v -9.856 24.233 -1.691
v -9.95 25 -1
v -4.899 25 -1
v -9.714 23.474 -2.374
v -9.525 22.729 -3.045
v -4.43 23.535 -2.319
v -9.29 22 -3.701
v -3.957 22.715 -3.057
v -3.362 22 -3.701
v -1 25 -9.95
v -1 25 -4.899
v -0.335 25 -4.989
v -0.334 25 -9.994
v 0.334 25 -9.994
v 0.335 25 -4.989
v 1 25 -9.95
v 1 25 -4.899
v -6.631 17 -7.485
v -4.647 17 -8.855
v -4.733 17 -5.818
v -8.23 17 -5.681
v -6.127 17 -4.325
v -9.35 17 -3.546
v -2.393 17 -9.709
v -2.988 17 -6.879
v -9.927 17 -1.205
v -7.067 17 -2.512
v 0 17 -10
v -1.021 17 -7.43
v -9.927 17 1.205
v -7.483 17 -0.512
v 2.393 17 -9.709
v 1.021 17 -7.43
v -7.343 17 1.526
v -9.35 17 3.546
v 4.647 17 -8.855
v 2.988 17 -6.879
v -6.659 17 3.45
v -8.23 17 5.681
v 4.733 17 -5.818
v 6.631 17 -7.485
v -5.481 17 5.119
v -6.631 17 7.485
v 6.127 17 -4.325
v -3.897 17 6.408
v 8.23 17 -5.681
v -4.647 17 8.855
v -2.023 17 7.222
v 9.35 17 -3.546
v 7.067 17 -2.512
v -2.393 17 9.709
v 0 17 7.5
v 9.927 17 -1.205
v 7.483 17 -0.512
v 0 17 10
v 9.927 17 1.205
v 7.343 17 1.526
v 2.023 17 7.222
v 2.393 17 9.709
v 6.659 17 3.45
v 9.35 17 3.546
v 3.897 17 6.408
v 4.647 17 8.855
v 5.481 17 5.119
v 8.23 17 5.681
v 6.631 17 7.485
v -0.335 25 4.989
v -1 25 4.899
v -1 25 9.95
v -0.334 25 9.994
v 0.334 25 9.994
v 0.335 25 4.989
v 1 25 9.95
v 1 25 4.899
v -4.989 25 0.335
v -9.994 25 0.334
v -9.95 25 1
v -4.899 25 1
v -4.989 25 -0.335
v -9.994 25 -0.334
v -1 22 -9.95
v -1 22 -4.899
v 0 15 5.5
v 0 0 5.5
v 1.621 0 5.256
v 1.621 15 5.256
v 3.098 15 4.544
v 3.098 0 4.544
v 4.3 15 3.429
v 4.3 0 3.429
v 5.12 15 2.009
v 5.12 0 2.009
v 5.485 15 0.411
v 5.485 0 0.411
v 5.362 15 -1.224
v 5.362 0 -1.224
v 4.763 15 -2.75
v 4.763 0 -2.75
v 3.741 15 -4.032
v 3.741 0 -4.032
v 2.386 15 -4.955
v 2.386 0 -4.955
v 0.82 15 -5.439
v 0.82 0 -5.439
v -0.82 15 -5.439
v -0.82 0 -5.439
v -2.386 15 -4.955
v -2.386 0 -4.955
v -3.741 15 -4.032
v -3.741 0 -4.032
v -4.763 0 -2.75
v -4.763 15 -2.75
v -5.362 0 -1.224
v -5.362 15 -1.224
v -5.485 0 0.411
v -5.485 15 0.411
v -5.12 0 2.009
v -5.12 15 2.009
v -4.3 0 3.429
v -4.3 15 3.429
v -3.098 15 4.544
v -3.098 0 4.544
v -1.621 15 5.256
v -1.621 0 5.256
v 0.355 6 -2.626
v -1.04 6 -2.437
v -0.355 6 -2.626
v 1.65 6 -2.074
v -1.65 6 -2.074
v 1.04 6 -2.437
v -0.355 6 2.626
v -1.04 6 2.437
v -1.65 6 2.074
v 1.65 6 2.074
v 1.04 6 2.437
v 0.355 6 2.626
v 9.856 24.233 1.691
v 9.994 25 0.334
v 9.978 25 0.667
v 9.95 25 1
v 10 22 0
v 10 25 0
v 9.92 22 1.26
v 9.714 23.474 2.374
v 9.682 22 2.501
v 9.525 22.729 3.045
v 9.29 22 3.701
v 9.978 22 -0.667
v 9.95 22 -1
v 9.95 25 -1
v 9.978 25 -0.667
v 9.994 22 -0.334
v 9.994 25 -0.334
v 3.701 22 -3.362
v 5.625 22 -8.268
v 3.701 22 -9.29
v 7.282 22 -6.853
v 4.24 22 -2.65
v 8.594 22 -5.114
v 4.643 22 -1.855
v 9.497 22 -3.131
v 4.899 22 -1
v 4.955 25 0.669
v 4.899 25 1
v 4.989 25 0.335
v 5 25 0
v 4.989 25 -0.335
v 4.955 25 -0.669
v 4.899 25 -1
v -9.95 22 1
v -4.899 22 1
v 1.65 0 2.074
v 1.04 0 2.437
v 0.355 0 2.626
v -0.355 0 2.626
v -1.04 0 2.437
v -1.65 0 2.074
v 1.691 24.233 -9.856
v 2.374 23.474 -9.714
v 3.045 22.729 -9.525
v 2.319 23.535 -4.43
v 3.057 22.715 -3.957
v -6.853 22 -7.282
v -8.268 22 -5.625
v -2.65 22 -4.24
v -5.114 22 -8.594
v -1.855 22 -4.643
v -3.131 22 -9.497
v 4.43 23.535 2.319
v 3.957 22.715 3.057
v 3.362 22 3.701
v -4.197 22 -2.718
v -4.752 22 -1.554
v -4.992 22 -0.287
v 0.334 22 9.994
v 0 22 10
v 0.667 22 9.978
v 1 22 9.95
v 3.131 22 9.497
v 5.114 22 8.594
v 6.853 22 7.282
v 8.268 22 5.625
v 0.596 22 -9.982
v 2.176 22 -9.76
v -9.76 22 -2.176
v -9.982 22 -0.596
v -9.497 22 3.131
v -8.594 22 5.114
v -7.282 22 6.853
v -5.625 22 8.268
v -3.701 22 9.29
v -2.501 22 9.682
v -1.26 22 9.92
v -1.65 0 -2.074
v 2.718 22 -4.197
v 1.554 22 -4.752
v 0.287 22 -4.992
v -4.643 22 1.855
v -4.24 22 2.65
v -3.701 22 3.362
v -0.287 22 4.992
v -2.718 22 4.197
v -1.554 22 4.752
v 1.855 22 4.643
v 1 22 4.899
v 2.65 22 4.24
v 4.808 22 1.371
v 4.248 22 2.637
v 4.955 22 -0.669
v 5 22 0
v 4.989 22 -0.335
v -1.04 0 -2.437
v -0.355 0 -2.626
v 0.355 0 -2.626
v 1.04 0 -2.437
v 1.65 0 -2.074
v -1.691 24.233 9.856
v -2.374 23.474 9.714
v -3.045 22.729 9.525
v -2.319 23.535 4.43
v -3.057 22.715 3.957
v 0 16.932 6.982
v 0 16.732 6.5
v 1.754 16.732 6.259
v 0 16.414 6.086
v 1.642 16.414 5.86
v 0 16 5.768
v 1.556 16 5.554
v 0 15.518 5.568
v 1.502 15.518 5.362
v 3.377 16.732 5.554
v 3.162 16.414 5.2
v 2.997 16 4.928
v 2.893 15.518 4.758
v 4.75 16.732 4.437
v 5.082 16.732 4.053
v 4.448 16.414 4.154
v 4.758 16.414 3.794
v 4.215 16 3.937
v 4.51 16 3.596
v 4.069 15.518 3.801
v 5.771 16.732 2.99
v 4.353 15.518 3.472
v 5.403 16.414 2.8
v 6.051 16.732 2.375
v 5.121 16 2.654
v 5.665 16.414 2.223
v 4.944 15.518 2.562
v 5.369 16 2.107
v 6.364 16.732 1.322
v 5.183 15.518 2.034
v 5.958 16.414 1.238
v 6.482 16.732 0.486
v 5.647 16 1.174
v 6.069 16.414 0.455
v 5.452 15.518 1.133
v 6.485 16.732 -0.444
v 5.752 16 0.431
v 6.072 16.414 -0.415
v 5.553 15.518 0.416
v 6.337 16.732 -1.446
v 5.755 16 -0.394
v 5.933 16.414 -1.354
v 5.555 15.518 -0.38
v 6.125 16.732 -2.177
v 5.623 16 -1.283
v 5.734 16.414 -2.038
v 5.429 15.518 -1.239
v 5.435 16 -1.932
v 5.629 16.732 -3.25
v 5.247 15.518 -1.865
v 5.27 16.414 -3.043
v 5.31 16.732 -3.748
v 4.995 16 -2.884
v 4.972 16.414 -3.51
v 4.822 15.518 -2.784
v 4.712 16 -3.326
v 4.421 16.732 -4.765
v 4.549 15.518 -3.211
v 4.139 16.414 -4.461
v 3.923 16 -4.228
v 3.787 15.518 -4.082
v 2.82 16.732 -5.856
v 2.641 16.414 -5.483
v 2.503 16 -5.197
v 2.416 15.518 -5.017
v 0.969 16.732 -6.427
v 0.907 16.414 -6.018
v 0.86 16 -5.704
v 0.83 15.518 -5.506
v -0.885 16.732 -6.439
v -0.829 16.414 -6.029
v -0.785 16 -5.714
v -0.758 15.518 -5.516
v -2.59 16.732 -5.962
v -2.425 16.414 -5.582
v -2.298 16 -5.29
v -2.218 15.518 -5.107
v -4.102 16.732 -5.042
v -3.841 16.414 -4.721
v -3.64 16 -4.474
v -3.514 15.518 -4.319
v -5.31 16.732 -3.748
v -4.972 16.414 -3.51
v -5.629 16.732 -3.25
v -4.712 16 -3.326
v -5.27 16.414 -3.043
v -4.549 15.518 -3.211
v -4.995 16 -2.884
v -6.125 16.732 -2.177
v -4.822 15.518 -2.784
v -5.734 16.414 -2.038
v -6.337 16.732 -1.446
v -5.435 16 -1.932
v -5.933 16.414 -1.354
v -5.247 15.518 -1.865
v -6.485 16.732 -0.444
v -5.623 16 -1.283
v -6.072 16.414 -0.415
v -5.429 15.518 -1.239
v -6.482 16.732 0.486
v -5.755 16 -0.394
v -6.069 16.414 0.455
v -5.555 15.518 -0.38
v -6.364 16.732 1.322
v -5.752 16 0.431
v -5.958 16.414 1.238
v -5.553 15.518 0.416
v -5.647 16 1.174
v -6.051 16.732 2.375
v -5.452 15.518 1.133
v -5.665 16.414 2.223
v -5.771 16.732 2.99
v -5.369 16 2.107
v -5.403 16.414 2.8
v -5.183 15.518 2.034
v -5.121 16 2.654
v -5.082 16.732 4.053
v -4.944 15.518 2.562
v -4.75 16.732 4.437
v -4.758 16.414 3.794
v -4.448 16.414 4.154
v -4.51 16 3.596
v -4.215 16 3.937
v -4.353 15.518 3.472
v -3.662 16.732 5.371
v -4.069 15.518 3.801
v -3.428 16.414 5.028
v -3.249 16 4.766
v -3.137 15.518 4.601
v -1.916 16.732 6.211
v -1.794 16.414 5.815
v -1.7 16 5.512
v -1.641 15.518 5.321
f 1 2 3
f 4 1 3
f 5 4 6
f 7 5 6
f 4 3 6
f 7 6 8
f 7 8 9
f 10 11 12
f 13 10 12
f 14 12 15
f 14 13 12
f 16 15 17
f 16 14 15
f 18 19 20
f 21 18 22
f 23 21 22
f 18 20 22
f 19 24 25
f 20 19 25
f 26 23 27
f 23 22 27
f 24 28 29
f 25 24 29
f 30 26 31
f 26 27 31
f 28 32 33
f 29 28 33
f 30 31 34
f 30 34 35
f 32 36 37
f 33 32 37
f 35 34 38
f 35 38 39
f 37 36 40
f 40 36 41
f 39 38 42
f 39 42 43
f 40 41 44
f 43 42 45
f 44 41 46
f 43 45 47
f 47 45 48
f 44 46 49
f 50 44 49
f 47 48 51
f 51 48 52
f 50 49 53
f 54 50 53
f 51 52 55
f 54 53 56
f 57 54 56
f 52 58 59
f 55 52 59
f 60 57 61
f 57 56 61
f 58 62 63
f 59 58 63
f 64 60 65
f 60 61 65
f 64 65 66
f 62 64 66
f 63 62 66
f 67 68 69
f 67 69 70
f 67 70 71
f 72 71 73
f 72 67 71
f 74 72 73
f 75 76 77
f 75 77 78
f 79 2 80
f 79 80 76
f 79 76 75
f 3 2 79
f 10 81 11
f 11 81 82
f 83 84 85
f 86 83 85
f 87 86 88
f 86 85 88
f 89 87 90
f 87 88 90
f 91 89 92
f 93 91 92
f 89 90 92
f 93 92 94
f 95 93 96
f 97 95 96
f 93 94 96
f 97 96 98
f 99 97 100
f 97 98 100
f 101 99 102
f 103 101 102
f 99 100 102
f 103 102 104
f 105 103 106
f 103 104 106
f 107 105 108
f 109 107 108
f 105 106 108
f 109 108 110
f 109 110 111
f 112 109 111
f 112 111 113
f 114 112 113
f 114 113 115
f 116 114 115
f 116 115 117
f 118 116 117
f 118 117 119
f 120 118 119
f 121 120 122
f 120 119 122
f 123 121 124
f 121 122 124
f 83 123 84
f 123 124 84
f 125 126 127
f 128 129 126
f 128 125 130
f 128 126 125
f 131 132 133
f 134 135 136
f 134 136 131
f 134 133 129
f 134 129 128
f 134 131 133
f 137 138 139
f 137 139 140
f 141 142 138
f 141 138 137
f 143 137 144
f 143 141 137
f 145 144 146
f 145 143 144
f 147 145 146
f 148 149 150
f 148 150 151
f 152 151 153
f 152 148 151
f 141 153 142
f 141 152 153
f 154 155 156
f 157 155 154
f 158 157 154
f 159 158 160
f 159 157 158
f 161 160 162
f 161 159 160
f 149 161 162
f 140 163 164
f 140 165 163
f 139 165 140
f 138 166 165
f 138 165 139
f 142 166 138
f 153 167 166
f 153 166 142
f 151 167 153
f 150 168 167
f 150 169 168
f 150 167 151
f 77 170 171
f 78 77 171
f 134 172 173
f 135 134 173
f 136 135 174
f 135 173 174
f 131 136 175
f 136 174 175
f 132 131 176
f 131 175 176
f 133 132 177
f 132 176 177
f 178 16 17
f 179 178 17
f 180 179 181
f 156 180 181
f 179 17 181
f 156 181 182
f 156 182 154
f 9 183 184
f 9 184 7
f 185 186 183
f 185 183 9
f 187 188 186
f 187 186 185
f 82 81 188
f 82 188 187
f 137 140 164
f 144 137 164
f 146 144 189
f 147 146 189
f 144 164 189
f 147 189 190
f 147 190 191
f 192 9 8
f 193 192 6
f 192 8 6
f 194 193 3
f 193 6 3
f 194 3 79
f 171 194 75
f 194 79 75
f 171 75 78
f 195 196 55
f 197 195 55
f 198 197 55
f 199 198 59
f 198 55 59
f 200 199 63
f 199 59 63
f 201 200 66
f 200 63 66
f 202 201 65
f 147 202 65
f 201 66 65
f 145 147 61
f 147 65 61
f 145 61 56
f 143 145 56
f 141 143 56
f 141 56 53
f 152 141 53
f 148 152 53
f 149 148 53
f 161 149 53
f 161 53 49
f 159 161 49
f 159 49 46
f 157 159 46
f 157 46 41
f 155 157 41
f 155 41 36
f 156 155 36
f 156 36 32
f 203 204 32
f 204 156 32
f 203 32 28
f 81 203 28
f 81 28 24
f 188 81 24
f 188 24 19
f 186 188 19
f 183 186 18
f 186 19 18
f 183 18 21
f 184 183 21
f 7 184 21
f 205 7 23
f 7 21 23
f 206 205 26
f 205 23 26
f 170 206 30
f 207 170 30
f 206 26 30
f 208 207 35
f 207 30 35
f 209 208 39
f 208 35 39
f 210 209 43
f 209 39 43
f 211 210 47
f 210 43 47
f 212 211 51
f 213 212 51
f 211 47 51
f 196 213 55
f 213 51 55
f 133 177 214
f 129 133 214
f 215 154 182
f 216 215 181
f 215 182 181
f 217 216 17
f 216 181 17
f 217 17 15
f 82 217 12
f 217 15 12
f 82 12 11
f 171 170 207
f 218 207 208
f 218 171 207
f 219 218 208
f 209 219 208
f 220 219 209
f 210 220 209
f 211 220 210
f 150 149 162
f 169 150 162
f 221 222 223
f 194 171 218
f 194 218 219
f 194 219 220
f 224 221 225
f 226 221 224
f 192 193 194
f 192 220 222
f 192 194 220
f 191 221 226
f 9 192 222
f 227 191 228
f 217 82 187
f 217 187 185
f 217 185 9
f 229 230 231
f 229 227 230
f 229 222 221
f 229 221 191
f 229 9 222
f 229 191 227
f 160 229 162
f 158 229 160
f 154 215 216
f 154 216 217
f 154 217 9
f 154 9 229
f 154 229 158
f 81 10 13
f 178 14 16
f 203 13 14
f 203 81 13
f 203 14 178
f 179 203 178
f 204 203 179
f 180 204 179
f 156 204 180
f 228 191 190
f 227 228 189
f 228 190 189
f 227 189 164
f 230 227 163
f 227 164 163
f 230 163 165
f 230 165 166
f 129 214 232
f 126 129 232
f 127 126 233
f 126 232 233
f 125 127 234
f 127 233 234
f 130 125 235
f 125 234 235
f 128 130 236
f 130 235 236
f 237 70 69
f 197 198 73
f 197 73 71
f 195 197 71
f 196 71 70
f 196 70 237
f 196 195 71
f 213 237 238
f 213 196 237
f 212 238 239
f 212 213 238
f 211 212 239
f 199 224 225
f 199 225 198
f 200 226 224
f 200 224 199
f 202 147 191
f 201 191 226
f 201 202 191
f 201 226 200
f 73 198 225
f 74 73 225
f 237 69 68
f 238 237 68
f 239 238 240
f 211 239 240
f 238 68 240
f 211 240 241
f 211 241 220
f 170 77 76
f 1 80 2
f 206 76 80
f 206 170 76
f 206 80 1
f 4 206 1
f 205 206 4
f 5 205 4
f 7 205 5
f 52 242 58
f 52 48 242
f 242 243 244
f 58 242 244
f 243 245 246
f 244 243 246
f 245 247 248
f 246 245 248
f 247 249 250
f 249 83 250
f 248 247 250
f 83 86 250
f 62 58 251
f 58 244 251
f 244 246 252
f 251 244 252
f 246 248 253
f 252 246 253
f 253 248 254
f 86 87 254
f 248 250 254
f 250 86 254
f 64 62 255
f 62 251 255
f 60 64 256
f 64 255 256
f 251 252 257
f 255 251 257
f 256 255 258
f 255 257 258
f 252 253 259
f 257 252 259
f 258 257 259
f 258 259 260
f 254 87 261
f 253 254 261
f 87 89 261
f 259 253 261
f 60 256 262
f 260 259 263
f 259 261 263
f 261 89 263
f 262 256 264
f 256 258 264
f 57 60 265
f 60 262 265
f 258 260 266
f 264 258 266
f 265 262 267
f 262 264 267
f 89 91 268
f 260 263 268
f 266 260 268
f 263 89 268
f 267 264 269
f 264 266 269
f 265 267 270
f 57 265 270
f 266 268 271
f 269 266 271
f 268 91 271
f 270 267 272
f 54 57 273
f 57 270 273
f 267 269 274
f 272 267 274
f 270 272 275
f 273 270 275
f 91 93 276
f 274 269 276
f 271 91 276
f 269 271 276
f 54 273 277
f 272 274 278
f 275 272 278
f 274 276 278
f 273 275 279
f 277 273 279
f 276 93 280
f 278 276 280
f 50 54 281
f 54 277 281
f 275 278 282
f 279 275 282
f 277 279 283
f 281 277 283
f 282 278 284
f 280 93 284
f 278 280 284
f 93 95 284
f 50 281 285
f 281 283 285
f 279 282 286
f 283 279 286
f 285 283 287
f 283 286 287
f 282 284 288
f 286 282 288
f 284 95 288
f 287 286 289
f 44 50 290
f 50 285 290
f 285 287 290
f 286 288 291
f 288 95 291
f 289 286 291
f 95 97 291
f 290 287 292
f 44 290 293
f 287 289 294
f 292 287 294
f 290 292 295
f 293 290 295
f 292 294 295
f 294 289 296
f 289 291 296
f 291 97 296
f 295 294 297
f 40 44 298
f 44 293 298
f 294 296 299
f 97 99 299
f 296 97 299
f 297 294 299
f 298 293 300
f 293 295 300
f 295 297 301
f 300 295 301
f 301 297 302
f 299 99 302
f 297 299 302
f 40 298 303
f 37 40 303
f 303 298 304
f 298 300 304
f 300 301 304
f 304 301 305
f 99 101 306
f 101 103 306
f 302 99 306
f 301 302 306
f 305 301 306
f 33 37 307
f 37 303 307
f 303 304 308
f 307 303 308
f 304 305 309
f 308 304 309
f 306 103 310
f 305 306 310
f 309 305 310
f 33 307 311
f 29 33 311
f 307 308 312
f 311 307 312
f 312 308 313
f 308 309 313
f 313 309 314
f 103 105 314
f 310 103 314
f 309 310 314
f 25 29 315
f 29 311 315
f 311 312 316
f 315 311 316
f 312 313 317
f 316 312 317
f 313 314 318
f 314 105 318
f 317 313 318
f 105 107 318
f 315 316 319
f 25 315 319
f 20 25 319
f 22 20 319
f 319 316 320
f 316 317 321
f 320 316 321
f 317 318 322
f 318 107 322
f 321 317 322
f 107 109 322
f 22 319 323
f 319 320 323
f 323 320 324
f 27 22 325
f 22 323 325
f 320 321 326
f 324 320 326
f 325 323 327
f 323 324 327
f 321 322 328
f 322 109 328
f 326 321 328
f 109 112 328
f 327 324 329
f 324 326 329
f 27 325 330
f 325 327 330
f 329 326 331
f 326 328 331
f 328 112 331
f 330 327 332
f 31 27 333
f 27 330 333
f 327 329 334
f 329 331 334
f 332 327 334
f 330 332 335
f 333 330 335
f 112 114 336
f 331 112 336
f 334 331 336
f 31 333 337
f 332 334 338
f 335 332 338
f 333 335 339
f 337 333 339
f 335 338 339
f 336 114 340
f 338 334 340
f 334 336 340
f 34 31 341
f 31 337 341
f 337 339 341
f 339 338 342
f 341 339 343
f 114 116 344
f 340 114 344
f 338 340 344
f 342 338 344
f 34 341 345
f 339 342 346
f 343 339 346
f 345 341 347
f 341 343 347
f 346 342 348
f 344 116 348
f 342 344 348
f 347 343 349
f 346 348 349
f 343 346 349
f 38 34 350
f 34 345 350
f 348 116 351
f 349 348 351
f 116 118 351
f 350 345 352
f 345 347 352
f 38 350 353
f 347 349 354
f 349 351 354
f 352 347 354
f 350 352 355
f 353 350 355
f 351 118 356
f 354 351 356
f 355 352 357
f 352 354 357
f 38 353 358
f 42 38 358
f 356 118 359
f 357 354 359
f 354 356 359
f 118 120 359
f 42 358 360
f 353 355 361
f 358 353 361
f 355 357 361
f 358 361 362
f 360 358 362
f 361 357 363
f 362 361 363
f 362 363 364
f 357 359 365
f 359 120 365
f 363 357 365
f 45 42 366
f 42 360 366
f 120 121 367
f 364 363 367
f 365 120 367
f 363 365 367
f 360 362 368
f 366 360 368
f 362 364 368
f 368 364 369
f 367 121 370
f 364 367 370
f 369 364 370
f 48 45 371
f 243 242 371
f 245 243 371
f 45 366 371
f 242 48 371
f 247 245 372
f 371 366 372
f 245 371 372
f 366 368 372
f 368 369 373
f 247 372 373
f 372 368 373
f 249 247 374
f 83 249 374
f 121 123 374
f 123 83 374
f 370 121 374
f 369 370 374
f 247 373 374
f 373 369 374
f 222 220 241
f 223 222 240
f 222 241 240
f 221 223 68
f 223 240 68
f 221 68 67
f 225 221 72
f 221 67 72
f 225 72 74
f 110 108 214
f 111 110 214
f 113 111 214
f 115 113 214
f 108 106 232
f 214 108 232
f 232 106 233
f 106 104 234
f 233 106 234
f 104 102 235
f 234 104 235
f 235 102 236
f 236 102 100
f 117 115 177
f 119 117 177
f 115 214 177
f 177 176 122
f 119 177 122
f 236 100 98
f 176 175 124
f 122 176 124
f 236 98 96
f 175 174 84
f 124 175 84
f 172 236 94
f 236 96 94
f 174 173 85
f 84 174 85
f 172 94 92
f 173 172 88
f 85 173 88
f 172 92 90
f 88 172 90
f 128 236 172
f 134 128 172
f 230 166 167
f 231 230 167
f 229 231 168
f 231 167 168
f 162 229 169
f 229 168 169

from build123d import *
from build123d.topology import SkipClean

# Parameters (mm, degrees)
SKETCH1_R               = 5.5
BOSS_EXTRUDE1_DEPTH     = 17
SKETCH2_R               = 10
BOSS_EXTRUDE2_DEPTH     = 5
BOSS_EXTRUDE3_DEPTH     = 3
BOSS_EXTRUDE4_START     = -6.6383
BOSS_EXTRUDE4_DEPTH     = 6.6383
CIRPATTERN1_COUNT       = 4
SKETCH10_R              = 13.301263659
CUT_EXTRUDE3_DEPTH      = 4
CUT_EXTRUDE3_DEPTH_BACK = 23
FILLET1_R               = 2
CUT_EXTRUDE4_DEPTH      = 6
SKETCH12_R              = 5
CUT_EXTRUDE5_DEPTH      = 3


with BuildPart() as part:
    # Sketch1 → Boss-Extrude1 (new body)
    with BuildSketch(Plane(origin=(0, 0, 0), x_dir=(1, 0, 0), z_dir=(0, 1, 0))):
        with Locations(Location((0, 0, 0), (0, 0, 270))):  # turned: the seam where the file's is
            Circle(SKETCH1_R)
    extrude(amount=BOSS_EXTRUDE1_DEPTH)

    # Sketch2 → Boss-Extrude2 (add)
    with BuildSketch(Plane(origin=(0, 17, 0), x_dir=(1, 0, 0), z_dir=(0, 1, 0))):
        with Locations(Location((0, 0, 0), (0, 0, 270))):  # turned: the seam where the file's is
            Circle(SKETCH2_R)
    extrude(amount=BOSS_EXTRUDE2_DEPTH)

    # Sketch4 → Boss-Extrude3 (add)
    with BuildSketch(Plane(origin=(0, 22, 0), x_dir=(1, 0, 0), z_dir=(0, 1, 0))):
        with BuildLine():
            Line((1, 10), (-1, 10))
            Line((-1, 10), (-1, 4.898979486))
            ThreePointArc((-1, 4.898979486), (-3.535533906, 3.535533906), (-4.898979486, 1))
            Line((-4.898979486, 1), (-10, 1))
            Line((-10, 1), (-10, -1))
            Line((-10, -1), (-4.898979486, -1))
            ThreePointArc((-4.898979486, -1), (-3.535533906, -3.535533906), (-1, -4.898979486))
            Line((-1, -4.898979486), (-1, -10))
            Line((-1, -10), (1, -10))
            Line((1, -10), (1, -4.898979486))
            ThreePointArc((1, -4.898979486), (3.535533906, -3.535533906), (4.898979486, -1))
            Line((4.898979486, -1), (10, -1))
            Line((10, -1), (10, 1))
            Line((10, 1), (4.898979486, 1))
            ThreePointArc((4.898979486, 1), (3.535533906, 3.535533906), (1, 4.898979486))
            Line((1, 4.898979486), (1, 10))
        make_face()
    extrude(amount=BOSS_EXTRUDE3_DEPTH)

    # Sketch9 → Boss-Extrude4 (add)
    with BuildSketch(Plane(origin=(0, 0, -10), x_dir=(-1, 0, 0), z_dir=(0, 0, -1)).offset(BOSS_EXTRUDE4_START)):
        Polygon((-1, 25), (-3.701212133, 22), (-1, 22), align=None)
    boss_extrude4 = extrude(amount=BOSS_EXTRUDE4_DEPTH)

    # CirPattern1: Boss-Extrude4 ×4 about axis
    cirpattern1_axis = Axis((0, 0, 0), (0, 1, 0))
    for i in range(1, CIRPATTERN1_COUNT):
        add(boss_extrude4.rotate(cirpattern1_axis, i * 360 / CIRPATTERN1_COUNT))

    # Sketch10 → Cut-Extrude3 (cut, two sides)
    with BuildSketch(Plane(origin=(0, 22, 0), x_dir=(1, 0, 0), z_dir=(0, 1, 0))) as cut_extrude3_sk:
        Circle(SKETCH10_R)
        with BuildLine():
            ThreePointArc((9.949874371, 1), (9.987460731, 0.500627751), (10, 0))
            ThreePointArc((10, 0), (-8.276838809, -5.611946127), (3.701212133, 9.2898347))
            ThreePointArc((3.701212133, 9.2898347), (7.985510661, 6.019270677), (9.949874371, 1))
        make_face(mode=Mode.SUBTRACT)
    extrude(amount=CUT_EXTRUDE3_DEPTH, mode=Mode.SUBTRACT)
    extrude(cut_extrude3_sk.sketch, amount=-CUT_EXTRUDE3_DEPTH_BACK, mode=Mode.SUBTRACT)

    # Fillet1
    fillet1_edges = [part.edges().sort_by_distance(p)[0] for p in [
        (0, 17, -5.5),
    ]]
    fillet(fillet1_edges, radius=FILLET1_R)

    # Sketch11 → Cut-Extrude4 (cut)
    with SkipClean():  # keep this step's faces unmerged: merging them makes the solid invalid here
        with BuildSketch(Plane.XZ):
            with BuildLine():
                Line((1.650181126, -2.0735), (1.650181126, 2.0735))
                ThreePointArc((1.650181126, 2.0735), (0, 2.65), (-1.650181126, 2.0735))
                Line((-1.650181126, 2.0735), (-1.650181126, -2.0735))
                ThreePointArc((-1.650181126, -2.0735), (0, -2.65), (1.650181126, -2.0735))
            make_face()
        extrude(amount=-CUT_EXTRUDE4_DEPTH, mode=Mode.SUBTRACT)

    # Sketch12 → Cut-Extrude5 (cut)
    with SkipClean():  # keep this step's faces unmerged: merging them makes the solid invalid here
        with BuildSketch(Plane(origin=(0, 25, 0), x_dir=(1, 0, 0), z_dir=(0, 1, 0))):
            Circle(SKETCH12_R)
        extrude(amount=-CUT_EXTRUDE5_DEPTH, mode=Mode.SUBTRACT)


solid = part.part
